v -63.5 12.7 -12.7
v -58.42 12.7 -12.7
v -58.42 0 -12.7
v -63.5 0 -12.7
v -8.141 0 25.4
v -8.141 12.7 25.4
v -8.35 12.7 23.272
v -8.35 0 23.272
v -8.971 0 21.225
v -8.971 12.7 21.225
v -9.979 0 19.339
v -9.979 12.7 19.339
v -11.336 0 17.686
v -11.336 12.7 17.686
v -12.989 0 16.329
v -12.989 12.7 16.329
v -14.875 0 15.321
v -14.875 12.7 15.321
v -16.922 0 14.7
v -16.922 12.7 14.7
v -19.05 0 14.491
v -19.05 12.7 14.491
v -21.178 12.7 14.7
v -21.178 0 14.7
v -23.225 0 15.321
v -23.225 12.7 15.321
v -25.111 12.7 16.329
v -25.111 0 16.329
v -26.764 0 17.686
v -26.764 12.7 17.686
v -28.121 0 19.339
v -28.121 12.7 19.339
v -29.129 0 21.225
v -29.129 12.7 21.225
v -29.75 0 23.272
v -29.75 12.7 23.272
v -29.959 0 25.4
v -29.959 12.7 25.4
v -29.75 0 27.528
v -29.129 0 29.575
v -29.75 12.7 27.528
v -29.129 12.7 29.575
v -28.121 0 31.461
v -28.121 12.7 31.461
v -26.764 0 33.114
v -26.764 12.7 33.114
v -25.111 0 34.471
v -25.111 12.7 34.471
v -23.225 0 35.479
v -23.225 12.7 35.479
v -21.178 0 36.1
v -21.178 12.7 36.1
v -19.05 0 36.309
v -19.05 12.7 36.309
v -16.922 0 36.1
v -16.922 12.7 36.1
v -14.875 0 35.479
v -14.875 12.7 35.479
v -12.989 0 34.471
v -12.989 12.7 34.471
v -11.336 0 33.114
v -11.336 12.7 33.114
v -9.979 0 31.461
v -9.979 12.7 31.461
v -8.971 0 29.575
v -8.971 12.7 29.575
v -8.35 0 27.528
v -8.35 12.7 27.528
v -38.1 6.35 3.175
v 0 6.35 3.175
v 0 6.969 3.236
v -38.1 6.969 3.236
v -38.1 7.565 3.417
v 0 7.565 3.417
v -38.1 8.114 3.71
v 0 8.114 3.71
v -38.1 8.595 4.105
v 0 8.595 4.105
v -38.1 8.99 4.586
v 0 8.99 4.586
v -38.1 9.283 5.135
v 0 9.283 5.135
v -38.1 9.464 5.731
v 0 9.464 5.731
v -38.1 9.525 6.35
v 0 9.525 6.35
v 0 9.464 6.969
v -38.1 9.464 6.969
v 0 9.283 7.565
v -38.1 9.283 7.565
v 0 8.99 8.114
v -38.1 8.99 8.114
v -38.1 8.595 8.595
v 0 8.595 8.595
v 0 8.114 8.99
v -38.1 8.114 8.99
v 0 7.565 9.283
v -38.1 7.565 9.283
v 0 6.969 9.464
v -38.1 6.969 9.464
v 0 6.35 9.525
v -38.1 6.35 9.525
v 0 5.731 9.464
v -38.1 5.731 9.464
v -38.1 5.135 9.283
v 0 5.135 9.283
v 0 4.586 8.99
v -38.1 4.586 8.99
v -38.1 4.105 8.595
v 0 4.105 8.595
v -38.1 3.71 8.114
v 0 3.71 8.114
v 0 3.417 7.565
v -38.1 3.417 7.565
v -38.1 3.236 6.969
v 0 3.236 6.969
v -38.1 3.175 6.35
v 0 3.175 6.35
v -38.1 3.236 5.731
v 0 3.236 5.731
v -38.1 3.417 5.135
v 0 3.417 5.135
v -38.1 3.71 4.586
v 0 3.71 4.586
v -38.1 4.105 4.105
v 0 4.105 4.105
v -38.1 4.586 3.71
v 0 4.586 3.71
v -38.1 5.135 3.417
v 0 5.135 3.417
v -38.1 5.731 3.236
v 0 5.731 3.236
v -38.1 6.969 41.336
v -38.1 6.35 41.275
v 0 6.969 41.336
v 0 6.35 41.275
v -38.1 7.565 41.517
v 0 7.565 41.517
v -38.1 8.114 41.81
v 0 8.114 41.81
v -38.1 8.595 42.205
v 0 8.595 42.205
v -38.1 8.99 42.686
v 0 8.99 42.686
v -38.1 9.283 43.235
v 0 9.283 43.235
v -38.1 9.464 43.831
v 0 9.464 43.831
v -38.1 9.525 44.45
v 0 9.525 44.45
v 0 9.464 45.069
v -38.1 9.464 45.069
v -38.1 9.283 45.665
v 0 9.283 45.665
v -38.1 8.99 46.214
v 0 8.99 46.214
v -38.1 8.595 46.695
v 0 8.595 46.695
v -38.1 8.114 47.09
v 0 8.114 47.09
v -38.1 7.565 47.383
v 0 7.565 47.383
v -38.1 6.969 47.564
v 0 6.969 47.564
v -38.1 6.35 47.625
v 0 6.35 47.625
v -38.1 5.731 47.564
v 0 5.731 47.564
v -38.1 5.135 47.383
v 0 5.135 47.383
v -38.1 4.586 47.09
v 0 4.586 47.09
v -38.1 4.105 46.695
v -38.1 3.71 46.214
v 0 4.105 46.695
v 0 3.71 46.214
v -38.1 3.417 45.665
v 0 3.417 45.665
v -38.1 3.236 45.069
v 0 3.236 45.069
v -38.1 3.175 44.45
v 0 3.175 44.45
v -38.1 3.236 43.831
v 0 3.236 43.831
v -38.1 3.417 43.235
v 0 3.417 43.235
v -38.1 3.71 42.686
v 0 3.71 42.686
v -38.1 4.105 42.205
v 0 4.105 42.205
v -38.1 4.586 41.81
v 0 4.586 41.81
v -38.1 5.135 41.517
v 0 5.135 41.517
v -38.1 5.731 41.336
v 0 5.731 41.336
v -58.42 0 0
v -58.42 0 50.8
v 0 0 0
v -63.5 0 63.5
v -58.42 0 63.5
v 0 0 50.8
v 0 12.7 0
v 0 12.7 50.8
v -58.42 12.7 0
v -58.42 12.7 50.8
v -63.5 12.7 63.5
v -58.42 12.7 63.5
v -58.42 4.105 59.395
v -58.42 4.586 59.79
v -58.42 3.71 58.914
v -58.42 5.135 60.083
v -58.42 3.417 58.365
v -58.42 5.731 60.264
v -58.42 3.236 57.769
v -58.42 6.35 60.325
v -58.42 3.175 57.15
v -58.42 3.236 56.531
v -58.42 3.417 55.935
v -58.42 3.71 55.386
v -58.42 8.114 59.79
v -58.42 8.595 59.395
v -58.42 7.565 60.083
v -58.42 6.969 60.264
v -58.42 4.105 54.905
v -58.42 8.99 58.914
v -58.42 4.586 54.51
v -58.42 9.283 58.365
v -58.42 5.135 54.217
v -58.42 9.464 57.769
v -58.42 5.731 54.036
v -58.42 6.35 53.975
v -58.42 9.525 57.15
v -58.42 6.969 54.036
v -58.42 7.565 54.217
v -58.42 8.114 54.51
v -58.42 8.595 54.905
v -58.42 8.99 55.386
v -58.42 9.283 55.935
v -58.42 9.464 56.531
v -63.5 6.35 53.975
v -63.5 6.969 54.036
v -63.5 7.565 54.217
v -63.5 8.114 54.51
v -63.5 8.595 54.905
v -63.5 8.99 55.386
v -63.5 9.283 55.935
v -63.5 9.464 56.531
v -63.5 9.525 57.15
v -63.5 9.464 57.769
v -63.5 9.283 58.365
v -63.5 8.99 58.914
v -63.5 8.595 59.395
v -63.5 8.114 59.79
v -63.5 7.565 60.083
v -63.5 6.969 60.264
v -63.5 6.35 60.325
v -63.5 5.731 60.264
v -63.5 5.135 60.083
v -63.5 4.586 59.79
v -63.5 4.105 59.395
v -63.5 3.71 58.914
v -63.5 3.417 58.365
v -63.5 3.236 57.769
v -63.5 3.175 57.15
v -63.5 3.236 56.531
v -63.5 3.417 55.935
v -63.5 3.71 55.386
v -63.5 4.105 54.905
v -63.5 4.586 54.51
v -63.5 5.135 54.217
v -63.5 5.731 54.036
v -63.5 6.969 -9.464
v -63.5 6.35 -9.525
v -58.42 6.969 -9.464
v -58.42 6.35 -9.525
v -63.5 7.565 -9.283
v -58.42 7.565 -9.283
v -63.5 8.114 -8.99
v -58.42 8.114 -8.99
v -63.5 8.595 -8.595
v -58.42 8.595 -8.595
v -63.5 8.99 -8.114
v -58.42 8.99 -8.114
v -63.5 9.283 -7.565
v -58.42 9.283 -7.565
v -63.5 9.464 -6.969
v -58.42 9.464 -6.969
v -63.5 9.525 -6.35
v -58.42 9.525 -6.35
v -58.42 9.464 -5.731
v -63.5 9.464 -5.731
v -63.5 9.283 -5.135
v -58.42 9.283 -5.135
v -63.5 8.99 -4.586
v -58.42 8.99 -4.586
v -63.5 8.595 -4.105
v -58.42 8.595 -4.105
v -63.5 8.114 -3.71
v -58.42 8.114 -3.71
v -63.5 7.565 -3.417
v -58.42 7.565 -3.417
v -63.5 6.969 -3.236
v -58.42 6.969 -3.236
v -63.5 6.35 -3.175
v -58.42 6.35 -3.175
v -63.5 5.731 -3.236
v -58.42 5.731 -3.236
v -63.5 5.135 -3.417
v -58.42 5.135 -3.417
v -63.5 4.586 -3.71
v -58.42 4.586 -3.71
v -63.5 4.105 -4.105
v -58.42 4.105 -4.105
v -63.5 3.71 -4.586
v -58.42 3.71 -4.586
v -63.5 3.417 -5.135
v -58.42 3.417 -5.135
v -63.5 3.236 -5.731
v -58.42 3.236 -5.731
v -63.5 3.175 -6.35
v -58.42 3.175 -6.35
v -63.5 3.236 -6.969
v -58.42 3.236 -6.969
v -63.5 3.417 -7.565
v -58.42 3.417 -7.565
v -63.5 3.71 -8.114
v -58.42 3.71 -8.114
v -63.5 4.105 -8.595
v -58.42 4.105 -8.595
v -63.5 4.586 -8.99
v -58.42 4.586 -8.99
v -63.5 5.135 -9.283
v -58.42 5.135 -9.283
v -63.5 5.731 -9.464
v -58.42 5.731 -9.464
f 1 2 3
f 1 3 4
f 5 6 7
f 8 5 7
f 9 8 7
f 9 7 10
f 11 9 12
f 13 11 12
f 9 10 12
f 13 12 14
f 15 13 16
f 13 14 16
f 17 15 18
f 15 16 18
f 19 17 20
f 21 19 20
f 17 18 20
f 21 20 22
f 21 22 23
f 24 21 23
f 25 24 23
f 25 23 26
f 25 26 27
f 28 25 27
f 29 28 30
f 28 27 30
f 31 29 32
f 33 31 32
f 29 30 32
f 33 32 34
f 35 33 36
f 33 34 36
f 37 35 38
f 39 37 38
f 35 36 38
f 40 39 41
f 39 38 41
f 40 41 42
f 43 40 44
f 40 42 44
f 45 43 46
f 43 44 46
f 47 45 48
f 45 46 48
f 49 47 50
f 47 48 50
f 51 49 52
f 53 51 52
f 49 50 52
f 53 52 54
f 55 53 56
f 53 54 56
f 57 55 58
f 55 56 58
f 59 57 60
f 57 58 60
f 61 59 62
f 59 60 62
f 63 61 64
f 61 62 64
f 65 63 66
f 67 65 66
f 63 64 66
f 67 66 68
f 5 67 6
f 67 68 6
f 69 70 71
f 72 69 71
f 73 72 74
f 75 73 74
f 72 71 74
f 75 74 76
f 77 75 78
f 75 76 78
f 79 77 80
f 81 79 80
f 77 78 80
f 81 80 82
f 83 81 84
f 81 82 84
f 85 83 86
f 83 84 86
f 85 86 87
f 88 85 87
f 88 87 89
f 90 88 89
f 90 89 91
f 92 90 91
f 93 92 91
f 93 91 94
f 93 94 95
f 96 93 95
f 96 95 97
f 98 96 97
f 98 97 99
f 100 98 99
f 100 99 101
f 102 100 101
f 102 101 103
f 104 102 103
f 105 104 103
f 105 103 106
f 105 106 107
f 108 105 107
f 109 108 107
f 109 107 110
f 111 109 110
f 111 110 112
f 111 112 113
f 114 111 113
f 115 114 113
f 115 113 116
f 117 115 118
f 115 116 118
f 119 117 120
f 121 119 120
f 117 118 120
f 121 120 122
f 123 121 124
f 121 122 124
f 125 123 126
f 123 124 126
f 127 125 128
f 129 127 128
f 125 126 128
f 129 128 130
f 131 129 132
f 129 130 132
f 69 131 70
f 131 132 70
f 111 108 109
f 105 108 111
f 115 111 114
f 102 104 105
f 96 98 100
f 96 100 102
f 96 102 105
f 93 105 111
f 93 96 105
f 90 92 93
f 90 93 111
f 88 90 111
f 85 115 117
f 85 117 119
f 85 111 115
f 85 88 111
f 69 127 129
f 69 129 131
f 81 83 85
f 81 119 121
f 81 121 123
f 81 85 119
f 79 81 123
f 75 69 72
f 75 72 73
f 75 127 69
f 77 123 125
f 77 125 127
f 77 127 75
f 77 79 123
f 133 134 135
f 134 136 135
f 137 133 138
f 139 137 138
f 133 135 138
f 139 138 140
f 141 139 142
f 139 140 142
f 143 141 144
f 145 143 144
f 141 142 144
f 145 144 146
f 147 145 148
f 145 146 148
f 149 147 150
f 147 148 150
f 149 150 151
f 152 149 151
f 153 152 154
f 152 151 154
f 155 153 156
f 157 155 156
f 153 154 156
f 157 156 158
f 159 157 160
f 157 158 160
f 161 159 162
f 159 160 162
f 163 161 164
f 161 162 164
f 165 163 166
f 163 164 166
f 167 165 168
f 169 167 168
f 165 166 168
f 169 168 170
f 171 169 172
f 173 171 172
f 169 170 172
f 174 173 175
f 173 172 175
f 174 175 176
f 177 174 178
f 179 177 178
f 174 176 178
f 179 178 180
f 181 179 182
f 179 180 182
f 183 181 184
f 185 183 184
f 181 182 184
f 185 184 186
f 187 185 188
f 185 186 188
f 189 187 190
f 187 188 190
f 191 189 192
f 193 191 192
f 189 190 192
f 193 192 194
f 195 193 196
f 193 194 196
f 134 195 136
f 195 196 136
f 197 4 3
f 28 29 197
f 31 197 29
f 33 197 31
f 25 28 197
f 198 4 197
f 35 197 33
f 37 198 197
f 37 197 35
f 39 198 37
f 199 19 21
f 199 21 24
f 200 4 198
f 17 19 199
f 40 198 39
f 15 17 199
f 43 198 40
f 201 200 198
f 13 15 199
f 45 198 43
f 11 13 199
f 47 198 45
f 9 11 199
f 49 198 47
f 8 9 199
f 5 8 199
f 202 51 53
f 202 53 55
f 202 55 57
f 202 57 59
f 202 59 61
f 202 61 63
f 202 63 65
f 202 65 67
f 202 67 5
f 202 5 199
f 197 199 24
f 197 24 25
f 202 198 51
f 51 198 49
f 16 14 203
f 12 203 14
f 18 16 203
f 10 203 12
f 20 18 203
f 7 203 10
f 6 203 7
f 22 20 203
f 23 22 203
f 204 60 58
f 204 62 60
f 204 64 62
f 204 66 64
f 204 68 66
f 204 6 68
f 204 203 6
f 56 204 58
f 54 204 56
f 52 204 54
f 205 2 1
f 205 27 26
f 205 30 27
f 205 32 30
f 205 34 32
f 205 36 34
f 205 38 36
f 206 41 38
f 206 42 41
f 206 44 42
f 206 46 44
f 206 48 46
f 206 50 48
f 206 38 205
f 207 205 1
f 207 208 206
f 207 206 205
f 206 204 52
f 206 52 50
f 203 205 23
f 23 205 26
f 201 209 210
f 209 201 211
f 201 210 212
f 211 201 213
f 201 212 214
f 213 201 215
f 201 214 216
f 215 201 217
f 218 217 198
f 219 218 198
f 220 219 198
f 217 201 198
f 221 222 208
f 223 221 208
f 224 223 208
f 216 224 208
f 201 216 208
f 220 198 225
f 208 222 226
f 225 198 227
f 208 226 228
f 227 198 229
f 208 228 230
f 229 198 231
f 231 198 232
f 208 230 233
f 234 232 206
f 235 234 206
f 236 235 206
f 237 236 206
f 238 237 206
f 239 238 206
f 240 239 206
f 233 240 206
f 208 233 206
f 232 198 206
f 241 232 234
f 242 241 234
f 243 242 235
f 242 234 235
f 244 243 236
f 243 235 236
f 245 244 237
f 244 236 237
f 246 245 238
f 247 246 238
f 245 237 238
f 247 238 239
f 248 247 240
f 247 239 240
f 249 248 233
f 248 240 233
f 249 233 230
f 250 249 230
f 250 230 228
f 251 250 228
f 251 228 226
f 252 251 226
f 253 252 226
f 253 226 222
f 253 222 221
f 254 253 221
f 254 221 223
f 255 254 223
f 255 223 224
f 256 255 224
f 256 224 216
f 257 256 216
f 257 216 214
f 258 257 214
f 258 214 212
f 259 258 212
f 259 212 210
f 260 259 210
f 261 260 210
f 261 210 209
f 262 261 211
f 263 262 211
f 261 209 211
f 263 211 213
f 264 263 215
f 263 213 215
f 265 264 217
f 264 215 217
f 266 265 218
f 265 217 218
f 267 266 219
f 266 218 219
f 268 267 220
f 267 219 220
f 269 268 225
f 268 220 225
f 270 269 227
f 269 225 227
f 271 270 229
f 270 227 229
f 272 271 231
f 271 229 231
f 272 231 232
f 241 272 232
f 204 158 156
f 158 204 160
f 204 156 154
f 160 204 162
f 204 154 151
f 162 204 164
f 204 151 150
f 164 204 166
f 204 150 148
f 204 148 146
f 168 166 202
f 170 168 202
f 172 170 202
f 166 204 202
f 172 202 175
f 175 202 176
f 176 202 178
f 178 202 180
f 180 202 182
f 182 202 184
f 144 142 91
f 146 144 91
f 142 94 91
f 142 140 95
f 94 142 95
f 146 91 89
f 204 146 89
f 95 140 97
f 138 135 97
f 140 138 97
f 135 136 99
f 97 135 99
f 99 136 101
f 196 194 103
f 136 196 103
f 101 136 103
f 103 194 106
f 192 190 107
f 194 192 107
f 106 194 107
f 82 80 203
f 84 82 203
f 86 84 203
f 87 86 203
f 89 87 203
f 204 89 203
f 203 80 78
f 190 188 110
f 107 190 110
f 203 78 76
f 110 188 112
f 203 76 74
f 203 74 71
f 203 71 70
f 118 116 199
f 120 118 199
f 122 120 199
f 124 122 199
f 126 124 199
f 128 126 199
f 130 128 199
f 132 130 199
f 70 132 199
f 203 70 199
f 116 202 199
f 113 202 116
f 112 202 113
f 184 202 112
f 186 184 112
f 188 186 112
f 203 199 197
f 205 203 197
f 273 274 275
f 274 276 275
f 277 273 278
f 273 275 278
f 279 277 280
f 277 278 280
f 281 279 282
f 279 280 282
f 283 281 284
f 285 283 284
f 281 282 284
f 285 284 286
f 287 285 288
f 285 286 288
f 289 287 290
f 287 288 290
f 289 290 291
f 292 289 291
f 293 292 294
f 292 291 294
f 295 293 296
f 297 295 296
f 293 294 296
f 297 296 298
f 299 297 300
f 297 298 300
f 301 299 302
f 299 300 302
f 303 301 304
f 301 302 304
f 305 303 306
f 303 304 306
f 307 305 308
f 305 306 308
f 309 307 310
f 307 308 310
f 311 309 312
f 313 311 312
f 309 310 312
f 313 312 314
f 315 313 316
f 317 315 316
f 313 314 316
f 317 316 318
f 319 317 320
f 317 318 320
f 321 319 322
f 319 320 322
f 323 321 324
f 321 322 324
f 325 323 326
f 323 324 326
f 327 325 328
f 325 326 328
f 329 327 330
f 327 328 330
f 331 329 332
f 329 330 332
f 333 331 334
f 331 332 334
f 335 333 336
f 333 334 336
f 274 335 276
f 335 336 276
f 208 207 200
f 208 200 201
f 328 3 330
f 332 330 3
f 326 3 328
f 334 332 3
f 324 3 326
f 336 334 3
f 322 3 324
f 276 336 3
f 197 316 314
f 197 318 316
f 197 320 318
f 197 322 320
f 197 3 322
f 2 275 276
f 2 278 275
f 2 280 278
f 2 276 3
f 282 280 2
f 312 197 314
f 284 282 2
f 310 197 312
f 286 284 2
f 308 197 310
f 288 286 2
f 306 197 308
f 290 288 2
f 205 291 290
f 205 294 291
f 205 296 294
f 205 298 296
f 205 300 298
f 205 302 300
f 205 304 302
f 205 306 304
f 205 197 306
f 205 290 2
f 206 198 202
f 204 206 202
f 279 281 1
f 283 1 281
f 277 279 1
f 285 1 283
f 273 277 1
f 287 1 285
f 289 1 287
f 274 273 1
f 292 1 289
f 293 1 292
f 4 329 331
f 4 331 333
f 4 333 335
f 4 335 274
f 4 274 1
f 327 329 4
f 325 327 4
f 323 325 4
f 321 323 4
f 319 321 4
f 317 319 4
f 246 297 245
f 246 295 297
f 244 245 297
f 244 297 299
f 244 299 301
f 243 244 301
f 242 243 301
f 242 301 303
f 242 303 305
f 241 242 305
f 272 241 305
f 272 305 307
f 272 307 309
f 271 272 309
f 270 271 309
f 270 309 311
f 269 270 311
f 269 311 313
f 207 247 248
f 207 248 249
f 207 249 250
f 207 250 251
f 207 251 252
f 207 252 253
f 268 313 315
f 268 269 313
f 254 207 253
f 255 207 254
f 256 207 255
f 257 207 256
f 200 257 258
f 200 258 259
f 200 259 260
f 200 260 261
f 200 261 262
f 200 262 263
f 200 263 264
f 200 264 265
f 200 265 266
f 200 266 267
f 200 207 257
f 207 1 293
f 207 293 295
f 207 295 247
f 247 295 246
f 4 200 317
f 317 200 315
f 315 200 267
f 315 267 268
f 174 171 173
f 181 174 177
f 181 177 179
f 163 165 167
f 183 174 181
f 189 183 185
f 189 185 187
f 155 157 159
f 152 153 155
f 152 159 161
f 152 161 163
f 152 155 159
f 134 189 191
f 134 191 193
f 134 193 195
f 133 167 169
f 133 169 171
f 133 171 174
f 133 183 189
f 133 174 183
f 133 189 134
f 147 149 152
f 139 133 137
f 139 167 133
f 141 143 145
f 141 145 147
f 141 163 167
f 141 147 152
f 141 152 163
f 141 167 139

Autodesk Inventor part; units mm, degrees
ref_plane "YZ Plane" through (0, 0, 0) normal (1, 0, 0) x (0, 1, 0)
ref_plane "XZ Plane" through (0, 0, 0) normal (0, 1, 0) x (-1, 0, 0)
ref_plane "XY Plane" through (0, 0, 0) normal (0, 0, 1) x (1, 0, 0)
sketch "Sketch1" plane through (0, 0, 0) normal (0, 1, 0) x (-1, 0, 0)
  line L0 (0, 0) -> (63.5, 0)
  line L1 (63.5, 0) -> (63.5, 50.8)
  line L2 (63.5, 50.8) -> (0, 50.8)
  line L3 (0, 50.8) -> (0, 0)
  dimension "d0" = 63.5
  dimension "d1" = 50.8
extrude "Extrusion1" add sketch "Sketch1" along normal blind 12.7
sketch "Sketch3" plane through (0, 12.7, 0) normal (0, 1, 0) x (1, 0, 0)
  circle A0 centre (-19.05, -25.4) radius 10.9093
  line L0 (-63.5, -50.8) -> (0, -50.8) projected
  line L1 (0, -50.8) -> (0, 0) projected
  dimension "d9" = 21.8186
  dimension "d22" = 19.05
  dimension "d23" = 50.8
  dimension "d24" = 25.4
extrude "Extrusion3" cut sketch "Sketch3" against normal blind 25.4
sketch "Sketch4" plane through (-63.5, 0, 50.8) normal (0, 0, 1) x (1, 0, 0)
  line L0 (0, 12.7) -> (63.5, 12.7) projected
  line L1 (0, 0) -> (0, 12.7) projected
  line L2 (0, 0) -> (5.08, 0)
  line L3 (5.08, 0) -> (5.08, 12.7)
  line L4 (5.08, 12.7) -> (0, 12.7)
  line L5 (0, 12.7) -> (0, 0)
  dimension "d12" = 5.08
extrude "Extrusion4" add sketch "Sketch4" along normal blind 12.7
sketch "Sketch5" plane through (0, 0, 0) normal (0, 0, -1) x (-1, 0, 0)
  line L0 (0, 12.7) -> (63.5, 12.7) projected
  line L1 (63.5, 0) -> (58.42, 0)
  line L2 (58.42, 0) -> (58.42, 12.7)
  line L3 (58.42, 12.7) -> (63.5, 12.7)
  line L4 (63.5, 12.7) -> (63.5, 0)
  dimension "d15" = 5.08
extrude "Extrusion5" add sketch "Sketch5" along normal blind 12.7
sketch "Sketch6" plane through (0, 0, 50.8) normal (1, 0, 0) x (0, 0, -1)
  line L0 (50.8, 0) -> (50.8, 12.7) projected
  line L1 (0, 0) -> (0, 12.7) projected
  circle A0 centre (6.35, 6.35) radius 3.175
  circle A1 centre (44.45, 6.35) radius 3.175
  dimension "d18" = 6.35
  dimension "d19" = 6.35
  dimension "d20" = 6.35
  dimension "d21" = 6.35
extrude "Extrusion6" cut sketch "Sketch6" against normal blind 38.1
thread "Thread1" size "1/4-20 UNC" class "2B" standard "ANSI Unified Screw Threads" full length
thread "Thread2" size "1/4-20 UNC" class "2B" standard "ANSI Unified Screw Threads" full length
sketch "Sketch7" plane through (-58.42, 0, 0) normal (1, 0, 0) x (0, 0, -1)
  circle A0 centre (6.35, 6.35) radius 3.175
  dimension "d31" = 6.35
extrude "Extrusion7" cut sketch "Sketch7" against normal blind 38.1
sketch "Sketch8" plane through (-58.42, 0, 50.8) normal (1, 0, 0) x (0, 0, -1)
  circle A0 centre (-6.35, 6.35) radius 3.175
  point P0 (50.8, 0)
  dimension "d34" = 6.35
extrude "Extrusion8" cut sketch "Sketch8" against normal blind 38.1
equation "\"d24\" = 0.5 * d23"
properties part number "Pipe bracket" material "Aluminum 6061"
